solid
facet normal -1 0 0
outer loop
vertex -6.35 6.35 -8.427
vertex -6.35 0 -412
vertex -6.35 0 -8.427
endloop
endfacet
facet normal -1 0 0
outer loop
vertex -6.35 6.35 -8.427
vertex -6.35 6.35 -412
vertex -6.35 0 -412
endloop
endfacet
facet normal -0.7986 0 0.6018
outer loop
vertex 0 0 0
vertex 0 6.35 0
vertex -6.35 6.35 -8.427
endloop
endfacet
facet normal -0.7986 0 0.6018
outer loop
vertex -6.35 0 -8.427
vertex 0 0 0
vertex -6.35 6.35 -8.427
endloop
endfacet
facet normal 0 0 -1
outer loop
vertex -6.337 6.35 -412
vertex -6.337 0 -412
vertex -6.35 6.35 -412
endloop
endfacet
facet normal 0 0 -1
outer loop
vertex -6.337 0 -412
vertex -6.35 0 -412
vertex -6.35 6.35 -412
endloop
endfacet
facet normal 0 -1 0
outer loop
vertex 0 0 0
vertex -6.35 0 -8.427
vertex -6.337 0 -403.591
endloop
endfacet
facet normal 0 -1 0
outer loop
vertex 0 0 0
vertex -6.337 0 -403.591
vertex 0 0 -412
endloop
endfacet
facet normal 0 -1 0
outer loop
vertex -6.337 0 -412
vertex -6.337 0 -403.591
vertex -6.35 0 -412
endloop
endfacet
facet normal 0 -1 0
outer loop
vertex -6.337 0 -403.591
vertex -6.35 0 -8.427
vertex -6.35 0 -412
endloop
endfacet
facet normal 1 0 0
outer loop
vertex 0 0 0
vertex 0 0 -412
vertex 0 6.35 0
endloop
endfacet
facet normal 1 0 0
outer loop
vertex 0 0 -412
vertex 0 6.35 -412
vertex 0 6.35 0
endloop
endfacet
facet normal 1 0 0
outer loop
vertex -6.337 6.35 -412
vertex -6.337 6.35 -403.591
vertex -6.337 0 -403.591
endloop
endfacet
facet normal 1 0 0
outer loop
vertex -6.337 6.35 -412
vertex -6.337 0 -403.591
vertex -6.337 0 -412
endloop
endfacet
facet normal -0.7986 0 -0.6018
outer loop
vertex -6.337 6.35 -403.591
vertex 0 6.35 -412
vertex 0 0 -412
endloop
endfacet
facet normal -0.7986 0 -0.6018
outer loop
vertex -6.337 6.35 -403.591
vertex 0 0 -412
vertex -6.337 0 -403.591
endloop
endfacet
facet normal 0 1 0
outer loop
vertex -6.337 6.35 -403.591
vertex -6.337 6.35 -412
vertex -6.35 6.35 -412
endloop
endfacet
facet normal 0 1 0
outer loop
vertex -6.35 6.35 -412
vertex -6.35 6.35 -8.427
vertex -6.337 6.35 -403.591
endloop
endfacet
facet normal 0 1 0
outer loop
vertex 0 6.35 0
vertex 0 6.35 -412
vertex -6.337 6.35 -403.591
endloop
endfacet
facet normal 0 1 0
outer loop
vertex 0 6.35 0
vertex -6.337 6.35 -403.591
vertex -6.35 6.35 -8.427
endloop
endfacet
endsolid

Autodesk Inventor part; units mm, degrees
ref_plane "YZ Plane" through (0, 0, 0) normal (1, 0, 0) x (0, 1, 0)
ref_plane "XZ Plane" through (0, 0, 0) normal (0, 1, 0) x (-1, 0, 0)
ref_plane "XY Plane" through (0, 0, 0) normal (0, 0, 1) x (1, 0, 0)
sketch "Sketch1" plane through (0, 0, 0) normal (0, 1, 0) x (-1, 0, 0)
  line L0 (0, 0) -> (0, -412)
  line L1 (0, -412) -> (6.35, -412)
  line L2 (6.35, -412) -> (6.35, 0)
  line L3 (6.35, 0) -> (0, 0)
  dimension "d0" = 412
  dimension "d1" = 6.35
extrude "Extrusion1" add sketch "Sketch1" along normal blind 6.35
sketch "Sketch2" plane through (0, 6.35, 0) normal (0, 1, 0) x (1, 0, 0)
  point P0 (0, 0)
sketch "Sketch3" plane through (-6.35, 0, -412) normal (-1, 0, 0) x (0, 0, 1)
  line L0 (412, 6.35) -> (0, 6.35) projected
  point P0 (412, 0)
sketch "Sketch4" plane through (-6.35, 0, -412) normal (-1, 0, 0) x (0, 0, 1)
  line L0 (412, 6.35) -> (403.5733, 0)
  line L1 (412, 0) -> (0, 0) projected
  line L2 (412, 6.35) -> (422.5514, 6.35) construction
  line L3 (403.5733, 0) -> (412, 0)
  line L4 (412, 0) -> (412, 6.35)
  dimension "d6" = 143
extrude "Extrusion2" cut sketch "Sketch4" against normal blind 10
sketch "Sketch5" plane through (-6.35, 0, -412) normal (-1, 0, 0) x (0, 0, 1)
  line L0 (0, 6.35) -> (8.4267, 0)
  line L1 (0, 6.35) -> (10.5514, 6.35) construction
  line L2 (8.4267, 0) -> (0, 0)
  line L3 (0, 6.35) -> (412, 6.35) projected
  line L4 (0, 0) -> (0, 6.35)
  point P0 (412, 0)
  dimension "d9" = 37
extrude "Extrusion3" cut sketch "Sketch5" against normal blind 10
sketch "Sketch6" plane through (-6.35, 0, -403.5733) normal (-1, 0, 0) x (0, 0, 1)
  line L0 (403.5733, 6.35) -> (-8.4267, 6.35) projected
  line L1 (403.5733, 6.35) -> (403.5733, 0)
  line L2 (403.5733, 6.35) -> (395.1465, 0) projected
  line L3 (403.5733, 0) -> (395.1465, 0)
  line L4 (395.1465, 0) -> (403.5733, 6.35)
extrude "Extrusion4" add sketch "Sketch6" against normal blind 6.35
sketch "Sketch7" plane through (-6.35, 6.35, -412) normal (-1, 0, 0) x (0, 0, 1)
  line L0 (8.4267, -6.35) -> (412, -6.35) projected
  line L1 (8.4267, -6.35) -> (0, -6.35)
  line L2 (0, 0) -> (412, 0) projected
  line L3 (0, -6.35) -> (0, 0)
  line L4 (0, 0) -> (8.4267, -6.35)
extrude "Extrusion5" add sketch "Sketch7" against normal blind 6.35
sketch "Sketch8" plane through (0, 6.35, 0) normal (0, 1, 0) x (1, 0, 0)
  line L0 (-6.35, 0) -> (0, 0) projected
  line L1 (0, 0) -> (-6.35, 8.4267)
  line L2 (0, 0) -> (10.5514, 0) construction
  line L3 (-6.35, 8.4267) -> (-6.35, 0)
  line L4 (-6.35, 0) -> (0, 0)
  dimension "d16" = 127
extrude "Extrusion6" cut sketch "Sketch8" against normal blind 10
sketch "Sketch9" plane through (0, 6.35, 0) normal (0, 1, 0) x (1, 0, 0)
  line L0 (0, 412) -> (-6.3367, 403.5909)
  line L1 (0, 412) -> (10.5293, 412) construction
  line L2 (-6.3367, 403.5909) -> (-6.3367, 412)
  line L3 (0, 0) -> (0, 412) projected
  line L4 (-6.3367, 412) -> (0, 412)
  dimension "d19" = 127
extrude "Extrusion7" cut sketch "Sketch9" against normal blind 10
properties part number "Main"
